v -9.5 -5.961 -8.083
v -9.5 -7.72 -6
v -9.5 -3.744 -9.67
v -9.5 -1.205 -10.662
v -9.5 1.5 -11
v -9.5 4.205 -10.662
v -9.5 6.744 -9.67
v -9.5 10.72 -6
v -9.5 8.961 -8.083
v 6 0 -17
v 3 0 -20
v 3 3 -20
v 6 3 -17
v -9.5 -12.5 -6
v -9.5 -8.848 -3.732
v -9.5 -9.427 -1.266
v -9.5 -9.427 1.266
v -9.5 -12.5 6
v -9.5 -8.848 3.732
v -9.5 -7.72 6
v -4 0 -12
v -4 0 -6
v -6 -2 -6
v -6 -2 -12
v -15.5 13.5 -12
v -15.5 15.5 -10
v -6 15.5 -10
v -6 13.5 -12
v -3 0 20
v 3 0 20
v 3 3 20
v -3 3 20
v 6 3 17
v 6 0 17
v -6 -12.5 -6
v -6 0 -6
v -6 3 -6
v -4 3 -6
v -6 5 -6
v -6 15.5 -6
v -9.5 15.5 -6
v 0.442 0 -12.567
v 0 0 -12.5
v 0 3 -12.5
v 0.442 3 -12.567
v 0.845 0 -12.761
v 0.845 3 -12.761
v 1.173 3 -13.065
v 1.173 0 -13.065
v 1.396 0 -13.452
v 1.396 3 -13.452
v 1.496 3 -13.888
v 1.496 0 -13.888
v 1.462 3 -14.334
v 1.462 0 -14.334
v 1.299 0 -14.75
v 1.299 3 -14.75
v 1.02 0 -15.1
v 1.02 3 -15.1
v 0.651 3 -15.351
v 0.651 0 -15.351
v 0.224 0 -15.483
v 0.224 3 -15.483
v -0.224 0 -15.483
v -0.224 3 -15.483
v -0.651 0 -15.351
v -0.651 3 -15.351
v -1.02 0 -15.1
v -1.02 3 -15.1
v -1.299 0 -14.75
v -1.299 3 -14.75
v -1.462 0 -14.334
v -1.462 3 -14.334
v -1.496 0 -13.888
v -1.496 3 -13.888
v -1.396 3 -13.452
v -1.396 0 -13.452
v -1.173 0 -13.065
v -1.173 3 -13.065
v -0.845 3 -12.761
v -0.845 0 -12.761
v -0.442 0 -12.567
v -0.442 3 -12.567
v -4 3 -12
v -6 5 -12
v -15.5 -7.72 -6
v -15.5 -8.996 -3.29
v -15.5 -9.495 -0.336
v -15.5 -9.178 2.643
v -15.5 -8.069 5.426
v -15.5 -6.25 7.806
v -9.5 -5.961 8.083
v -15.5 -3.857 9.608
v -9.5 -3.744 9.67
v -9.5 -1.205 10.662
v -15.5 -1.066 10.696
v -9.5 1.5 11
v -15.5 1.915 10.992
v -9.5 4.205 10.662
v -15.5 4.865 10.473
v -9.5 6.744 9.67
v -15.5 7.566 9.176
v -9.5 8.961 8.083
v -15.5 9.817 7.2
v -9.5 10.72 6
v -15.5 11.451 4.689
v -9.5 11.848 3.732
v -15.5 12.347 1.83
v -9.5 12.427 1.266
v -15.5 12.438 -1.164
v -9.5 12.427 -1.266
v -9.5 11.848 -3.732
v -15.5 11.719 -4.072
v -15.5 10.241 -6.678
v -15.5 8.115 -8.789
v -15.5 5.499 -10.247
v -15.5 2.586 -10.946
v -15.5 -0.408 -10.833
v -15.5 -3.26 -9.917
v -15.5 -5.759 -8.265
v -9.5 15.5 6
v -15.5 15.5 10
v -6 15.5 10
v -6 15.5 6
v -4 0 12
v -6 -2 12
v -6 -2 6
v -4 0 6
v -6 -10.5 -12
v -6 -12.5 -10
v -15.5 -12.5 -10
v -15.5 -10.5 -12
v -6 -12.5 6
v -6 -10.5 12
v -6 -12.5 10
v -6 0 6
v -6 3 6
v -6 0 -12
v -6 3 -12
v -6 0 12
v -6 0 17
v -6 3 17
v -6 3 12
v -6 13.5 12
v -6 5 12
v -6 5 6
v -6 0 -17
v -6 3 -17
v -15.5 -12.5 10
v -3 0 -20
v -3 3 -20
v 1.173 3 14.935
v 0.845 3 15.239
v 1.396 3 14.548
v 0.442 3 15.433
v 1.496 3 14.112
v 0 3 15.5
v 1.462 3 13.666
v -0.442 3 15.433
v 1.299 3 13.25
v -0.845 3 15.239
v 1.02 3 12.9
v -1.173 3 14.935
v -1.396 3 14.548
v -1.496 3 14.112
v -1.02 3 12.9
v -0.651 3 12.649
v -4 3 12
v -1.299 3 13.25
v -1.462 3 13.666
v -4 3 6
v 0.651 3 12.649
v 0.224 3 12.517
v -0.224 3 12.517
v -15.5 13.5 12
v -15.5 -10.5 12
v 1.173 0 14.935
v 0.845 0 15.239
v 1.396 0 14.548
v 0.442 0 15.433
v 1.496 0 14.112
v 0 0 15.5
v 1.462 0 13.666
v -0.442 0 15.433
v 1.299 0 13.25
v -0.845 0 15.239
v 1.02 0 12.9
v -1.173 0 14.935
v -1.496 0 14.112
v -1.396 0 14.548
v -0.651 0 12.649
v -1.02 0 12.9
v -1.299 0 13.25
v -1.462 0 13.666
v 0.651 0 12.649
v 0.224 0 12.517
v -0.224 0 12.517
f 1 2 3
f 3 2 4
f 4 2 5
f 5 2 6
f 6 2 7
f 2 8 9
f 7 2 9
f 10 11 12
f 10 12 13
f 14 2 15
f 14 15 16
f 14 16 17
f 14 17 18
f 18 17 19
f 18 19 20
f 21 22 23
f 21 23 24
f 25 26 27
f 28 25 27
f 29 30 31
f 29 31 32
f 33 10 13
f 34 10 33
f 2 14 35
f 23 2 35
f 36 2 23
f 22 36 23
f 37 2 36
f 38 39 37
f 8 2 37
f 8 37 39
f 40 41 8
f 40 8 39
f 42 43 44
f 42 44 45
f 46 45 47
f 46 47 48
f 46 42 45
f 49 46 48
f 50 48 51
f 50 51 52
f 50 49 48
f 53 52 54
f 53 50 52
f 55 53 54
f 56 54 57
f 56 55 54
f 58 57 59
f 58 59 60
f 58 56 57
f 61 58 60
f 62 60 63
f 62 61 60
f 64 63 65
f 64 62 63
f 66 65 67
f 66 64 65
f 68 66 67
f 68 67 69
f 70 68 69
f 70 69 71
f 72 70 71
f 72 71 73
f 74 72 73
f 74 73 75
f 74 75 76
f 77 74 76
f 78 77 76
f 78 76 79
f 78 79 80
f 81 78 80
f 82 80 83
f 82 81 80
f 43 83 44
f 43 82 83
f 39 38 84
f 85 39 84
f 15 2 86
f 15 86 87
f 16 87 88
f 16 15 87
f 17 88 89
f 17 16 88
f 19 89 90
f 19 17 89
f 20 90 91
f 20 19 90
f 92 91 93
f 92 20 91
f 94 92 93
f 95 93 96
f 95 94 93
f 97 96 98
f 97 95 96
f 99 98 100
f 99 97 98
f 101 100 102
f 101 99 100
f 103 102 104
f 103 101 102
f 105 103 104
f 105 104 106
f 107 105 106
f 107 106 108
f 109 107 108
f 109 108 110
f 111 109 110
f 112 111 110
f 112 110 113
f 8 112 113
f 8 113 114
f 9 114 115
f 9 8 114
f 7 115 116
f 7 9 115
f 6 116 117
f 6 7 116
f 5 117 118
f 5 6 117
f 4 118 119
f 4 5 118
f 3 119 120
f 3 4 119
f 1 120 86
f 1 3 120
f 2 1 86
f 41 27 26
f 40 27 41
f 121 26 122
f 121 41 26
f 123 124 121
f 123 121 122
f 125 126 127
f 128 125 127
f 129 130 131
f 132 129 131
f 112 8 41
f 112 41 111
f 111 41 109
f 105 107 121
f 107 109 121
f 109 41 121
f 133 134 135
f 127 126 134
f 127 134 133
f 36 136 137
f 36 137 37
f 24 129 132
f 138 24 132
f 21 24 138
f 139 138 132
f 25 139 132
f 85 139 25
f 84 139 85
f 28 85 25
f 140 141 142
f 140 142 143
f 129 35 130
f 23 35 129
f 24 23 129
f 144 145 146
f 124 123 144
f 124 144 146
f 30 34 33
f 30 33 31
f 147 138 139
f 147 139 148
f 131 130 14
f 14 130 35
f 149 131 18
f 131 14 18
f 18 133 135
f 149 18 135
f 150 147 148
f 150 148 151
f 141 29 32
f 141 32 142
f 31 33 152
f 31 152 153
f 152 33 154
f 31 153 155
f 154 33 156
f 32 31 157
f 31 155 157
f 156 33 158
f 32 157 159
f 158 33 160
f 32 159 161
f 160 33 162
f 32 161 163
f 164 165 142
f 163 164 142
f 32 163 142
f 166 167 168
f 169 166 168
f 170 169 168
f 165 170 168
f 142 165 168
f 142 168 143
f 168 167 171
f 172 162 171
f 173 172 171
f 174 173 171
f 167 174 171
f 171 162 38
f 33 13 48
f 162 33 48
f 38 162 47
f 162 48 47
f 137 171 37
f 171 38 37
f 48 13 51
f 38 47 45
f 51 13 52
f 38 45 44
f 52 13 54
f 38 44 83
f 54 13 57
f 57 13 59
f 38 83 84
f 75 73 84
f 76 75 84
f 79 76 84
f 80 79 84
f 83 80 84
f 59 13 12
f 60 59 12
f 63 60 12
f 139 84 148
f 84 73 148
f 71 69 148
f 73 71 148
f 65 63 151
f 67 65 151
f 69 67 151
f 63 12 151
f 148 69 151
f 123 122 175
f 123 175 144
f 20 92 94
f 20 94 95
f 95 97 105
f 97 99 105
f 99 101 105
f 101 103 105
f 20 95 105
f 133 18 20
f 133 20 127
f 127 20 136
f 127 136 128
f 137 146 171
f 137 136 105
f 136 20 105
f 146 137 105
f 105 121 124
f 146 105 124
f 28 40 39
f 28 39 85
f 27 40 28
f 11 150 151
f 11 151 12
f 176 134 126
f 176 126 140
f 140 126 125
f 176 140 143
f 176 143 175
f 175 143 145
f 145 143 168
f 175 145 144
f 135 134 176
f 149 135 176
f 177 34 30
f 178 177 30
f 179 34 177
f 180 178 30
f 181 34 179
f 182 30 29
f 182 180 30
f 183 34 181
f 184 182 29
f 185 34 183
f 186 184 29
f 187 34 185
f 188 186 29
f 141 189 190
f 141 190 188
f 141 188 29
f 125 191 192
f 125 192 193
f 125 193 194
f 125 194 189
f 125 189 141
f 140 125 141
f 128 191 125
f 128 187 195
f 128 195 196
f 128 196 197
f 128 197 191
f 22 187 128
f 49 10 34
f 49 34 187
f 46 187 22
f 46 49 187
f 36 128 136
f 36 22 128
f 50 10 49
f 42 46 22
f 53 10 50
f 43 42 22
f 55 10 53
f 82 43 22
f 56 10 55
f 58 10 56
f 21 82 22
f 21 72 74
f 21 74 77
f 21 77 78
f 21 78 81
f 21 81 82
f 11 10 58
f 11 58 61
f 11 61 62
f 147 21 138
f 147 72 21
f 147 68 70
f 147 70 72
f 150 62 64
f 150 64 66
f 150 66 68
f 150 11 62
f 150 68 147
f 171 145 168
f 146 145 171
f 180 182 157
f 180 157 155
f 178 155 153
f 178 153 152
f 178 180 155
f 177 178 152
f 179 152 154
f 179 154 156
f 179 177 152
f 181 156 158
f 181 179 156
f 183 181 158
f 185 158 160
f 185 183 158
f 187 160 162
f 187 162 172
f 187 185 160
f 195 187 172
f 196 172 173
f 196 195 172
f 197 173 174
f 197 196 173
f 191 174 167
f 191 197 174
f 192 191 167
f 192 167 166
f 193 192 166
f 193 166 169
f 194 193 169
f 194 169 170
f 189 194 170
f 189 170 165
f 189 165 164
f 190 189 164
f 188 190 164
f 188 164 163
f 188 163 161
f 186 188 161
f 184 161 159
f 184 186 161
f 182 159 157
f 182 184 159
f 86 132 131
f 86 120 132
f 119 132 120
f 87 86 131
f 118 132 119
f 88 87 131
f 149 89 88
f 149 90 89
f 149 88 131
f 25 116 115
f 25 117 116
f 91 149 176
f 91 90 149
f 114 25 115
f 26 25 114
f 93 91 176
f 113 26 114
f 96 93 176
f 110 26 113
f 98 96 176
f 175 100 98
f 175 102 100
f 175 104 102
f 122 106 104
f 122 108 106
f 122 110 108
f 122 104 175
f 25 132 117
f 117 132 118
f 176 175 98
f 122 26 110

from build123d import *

# Parameters (mm, degrees)
SKETCH1_R           = 1.5
BOSS_EXTRUDE1_DEPTH = 3
BOSS_EXTRUDE2_START = 12.5
SKETCH2_W           = 3.5
SKETCH2_H           = 6
BOSS_EXTRUDE2_DEPTH = 28
CHAMFER2_SIZE       = 2
SKETCH3_W           = 24
SKETCH3_H           = 28
SKETCH3_R           = 11
BOSS_EXTRUDE4_DEPTH = 6
CHAMFER3_SIZE       = 2


with BuildPart() as part:
    # Sketch1 → Boss-Extrude1 (new body)
    with BuildSketch(Plane(origin=(0, 0, 0), x_dir=(1, 0, 0), z_dir=(0, 1, 0))):
        Polygon((-6, 17), (-3, 20), (3, 20), (6, 17), (6, -17), (3, -20), (-3, -20), (-6, -17), align=None)
        with Locations(Location((0, 14, 0), (0, 0, 270))):
            Circle(SKETCH1_R, mode=Mode.SUBTRACT)
        with Locations(Location((0, -14, 0), (0, 0, 270))):
            Circle(SKETCH1_R, mode=Mode.SUBTRACT)
    extrude(amount=BOSS_EXTRUDE1_DEPTH)

    # Sketch2 → Boss-Extrude2 (add)
    with BuildSketch(Plane(origin=(0, 3, 0), x_dir=(1, 0, 0), z_dir=(0, 1, 0)).offset(BOSS_EXTRUDE2_START)):
        with Locations((-7.75, 9)):
            Rectangle(SKETCH2_W, SKETCH2_H)
        with Locations((-7.75, -9)):
            Rectangle(SKETCH2_W, SKETCH2_H)
    extrude(amount=-BOSS_EXTRUDE2_DEPTH)

    # Chamfer2
    chamfer2_edges = [part.edges().sort_by_distance(p)[0] for p in [
        (-6, 0, -9),
        (-6, 0, 9),
        (-6, 3, -9),
        (-6, 3, 9),
    ]]
    chamfer(chamfer2_edges, length=CHAMFER2_SIZE)

    # Sketch3 → Boss-Extrude4 (add)
    with BuildSketch(Plane.ZY.offset(9.5)):
        with Locations((0, 1.5)):
            Rectangle(SKETCH3_W, SKETCH3_H)
        with Locations(Location((0, 1.5, 0), (0, 0, 236.944268849))):
            Circle(SKETCH3_R, mode=Mode.SUBTRACT)
    extrude(amount=BOSS_EXTRUDE4_DEPTH)

    # Chamfer3
    chamfer3_edges = [part.edges().sort_by_distance(p)[0] for p in [
        (-10.75, 15.5, -12),
        (-10.75, -12.5, -12),
        (-10.75, -12.5, 12),
        (-10.75, 15.5, 12),
    ]]
    chamfer(chamfer3_edges, length=CHAMFER3_SIZE)


solid = part.part
